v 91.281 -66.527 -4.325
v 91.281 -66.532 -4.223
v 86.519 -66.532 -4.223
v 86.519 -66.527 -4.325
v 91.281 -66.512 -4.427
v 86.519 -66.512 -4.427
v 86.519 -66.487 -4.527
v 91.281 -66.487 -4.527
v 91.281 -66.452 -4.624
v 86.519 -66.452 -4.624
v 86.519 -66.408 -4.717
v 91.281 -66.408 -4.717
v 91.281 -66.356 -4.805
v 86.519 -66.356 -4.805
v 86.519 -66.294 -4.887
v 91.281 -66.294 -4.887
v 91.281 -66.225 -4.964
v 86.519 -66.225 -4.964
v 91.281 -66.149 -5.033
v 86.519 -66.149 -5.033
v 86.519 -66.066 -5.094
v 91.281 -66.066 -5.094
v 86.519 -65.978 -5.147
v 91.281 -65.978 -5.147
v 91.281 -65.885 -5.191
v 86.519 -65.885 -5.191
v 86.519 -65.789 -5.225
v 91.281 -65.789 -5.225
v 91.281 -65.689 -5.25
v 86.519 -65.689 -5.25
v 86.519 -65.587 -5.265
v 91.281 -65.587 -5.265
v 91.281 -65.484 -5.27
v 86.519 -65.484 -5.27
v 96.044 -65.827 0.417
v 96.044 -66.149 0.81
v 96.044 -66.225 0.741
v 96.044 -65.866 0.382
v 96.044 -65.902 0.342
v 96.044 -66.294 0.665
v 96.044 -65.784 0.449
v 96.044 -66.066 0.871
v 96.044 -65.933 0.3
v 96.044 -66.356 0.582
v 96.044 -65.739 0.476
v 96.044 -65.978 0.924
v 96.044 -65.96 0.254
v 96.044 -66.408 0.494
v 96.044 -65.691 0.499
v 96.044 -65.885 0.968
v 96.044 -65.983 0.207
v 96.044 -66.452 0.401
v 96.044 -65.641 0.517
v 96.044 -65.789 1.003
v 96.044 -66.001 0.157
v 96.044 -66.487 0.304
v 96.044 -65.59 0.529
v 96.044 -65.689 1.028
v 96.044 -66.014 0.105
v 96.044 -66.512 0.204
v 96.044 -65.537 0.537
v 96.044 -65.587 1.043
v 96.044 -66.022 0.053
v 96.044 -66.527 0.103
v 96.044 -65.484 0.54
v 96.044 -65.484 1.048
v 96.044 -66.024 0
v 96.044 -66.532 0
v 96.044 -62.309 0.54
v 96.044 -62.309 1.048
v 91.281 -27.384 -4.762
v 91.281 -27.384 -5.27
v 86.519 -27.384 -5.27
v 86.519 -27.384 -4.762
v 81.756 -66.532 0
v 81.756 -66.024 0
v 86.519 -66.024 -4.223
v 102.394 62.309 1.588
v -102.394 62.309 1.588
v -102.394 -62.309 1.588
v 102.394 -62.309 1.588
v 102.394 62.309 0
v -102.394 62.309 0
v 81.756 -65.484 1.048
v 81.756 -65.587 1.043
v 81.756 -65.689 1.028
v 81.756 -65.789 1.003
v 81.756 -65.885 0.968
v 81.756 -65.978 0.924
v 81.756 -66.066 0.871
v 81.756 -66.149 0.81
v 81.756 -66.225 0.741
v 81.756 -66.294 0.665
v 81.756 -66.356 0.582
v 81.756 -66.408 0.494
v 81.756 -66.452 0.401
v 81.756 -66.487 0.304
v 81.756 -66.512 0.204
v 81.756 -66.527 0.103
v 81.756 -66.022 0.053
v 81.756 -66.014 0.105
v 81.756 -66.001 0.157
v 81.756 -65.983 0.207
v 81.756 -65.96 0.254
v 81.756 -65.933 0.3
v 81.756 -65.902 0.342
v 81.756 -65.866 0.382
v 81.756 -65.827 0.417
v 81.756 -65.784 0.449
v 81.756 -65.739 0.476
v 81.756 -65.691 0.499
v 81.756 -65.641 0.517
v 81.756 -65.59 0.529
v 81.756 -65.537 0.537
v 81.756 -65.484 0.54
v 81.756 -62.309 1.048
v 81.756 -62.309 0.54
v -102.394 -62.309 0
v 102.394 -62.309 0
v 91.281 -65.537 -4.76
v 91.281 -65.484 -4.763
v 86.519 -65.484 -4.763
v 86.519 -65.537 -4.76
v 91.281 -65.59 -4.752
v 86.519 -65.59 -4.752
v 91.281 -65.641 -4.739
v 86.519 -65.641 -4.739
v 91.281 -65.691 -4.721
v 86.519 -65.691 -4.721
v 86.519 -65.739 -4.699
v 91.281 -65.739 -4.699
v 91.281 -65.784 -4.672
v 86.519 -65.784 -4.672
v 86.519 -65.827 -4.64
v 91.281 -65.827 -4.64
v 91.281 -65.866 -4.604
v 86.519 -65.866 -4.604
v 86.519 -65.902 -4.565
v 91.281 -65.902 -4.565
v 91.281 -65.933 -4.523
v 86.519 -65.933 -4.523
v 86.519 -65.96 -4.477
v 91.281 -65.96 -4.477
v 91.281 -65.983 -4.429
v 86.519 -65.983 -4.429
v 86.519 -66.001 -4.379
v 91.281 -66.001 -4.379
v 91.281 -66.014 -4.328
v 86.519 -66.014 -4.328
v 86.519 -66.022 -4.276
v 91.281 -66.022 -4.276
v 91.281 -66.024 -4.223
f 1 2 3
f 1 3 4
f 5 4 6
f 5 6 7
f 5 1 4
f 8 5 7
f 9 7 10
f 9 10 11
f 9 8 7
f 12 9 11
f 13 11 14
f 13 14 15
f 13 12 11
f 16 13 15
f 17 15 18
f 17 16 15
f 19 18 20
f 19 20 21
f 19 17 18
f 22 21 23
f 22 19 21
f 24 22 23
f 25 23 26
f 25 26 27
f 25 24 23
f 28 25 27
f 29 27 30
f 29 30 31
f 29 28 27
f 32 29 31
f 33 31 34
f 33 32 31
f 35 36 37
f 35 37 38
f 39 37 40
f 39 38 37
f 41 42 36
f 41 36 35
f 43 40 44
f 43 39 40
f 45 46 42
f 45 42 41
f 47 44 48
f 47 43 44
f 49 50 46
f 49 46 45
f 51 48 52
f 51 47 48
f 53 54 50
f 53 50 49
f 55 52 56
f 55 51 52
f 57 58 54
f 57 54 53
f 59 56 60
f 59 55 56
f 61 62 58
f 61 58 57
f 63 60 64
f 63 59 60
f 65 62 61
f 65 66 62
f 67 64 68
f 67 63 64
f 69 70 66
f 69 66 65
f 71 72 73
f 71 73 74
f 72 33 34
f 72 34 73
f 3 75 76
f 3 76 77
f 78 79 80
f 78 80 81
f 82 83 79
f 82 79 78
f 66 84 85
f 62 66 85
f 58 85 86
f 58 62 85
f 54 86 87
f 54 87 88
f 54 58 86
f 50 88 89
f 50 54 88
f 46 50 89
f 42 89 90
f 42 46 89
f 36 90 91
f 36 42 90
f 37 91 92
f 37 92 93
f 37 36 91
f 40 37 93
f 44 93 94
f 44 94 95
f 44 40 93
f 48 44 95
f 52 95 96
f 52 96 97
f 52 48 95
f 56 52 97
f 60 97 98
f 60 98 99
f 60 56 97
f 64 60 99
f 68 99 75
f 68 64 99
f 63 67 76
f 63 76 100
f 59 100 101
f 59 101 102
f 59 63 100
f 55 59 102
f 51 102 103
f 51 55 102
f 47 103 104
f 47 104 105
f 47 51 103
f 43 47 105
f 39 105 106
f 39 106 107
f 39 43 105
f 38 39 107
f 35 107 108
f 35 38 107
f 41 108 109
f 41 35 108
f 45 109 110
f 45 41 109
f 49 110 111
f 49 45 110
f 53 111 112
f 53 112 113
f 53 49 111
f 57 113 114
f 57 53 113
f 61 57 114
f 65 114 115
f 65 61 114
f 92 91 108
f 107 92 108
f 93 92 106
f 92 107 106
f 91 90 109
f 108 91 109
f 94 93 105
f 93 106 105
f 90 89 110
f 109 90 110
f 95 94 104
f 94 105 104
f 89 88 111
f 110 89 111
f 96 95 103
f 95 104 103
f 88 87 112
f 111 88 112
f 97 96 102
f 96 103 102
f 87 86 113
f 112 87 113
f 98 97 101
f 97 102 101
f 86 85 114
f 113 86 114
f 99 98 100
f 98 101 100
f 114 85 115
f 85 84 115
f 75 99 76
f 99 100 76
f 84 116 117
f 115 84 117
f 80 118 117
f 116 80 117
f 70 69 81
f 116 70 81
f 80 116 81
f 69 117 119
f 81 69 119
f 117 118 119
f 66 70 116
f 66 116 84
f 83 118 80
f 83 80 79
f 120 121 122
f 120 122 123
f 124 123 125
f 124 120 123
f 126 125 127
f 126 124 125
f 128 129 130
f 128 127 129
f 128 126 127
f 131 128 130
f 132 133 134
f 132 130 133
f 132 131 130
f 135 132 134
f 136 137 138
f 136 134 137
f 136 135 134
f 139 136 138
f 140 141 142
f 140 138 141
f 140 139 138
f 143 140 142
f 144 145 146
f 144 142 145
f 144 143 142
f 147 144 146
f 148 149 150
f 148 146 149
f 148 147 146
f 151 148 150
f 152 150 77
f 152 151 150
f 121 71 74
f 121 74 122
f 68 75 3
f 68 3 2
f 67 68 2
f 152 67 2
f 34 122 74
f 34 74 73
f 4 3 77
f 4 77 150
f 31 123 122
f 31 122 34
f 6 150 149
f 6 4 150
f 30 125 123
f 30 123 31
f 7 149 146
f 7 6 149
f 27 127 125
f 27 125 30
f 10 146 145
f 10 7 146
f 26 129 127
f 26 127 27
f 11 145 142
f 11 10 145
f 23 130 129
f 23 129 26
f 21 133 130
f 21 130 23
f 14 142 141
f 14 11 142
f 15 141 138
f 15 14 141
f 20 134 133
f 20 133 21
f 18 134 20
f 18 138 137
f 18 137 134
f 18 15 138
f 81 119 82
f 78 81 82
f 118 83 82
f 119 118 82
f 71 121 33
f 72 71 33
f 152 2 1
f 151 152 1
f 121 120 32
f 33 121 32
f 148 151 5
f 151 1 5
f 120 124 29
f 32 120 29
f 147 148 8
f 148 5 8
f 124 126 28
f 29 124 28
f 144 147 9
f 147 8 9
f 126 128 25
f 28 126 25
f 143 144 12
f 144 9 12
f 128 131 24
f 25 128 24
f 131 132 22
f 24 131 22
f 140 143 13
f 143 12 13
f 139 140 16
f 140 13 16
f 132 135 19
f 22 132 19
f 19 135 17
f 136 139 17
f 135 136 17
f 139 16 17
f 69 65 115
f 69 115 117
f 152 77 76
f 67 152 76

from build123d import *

# Parameters (mm, degrees)
SKETCH1_W           = 204.7875
SKETCH1_H           = 124.61875
BOSS_EXTRUDE1_DEPTH = 1.5875
EXTRUDE_THIN1_DEPTH = 14.2875
CUT_EXTRUDE1_DEPTH  = 165.658404983


with BuildPart() as part:
    # Sketch1 → Boss-Extrude1 (new body)
    with BuildSketch(Plane.XY):
        Rectangle(SKETCH1_W, SKETCH1_H)
    extrude(amount=BOSS_EXTRUDE1_DEPTH)

    # Sketch2 → Extrude-Thin1 (add)
    with BuildSketch(Plane(origin=(96.04375, 0, 0), x_dir=(0, 0, -1), z_dir=(1, 0, 0))):
        with BuildLine():
            Line((-1.04775, -62.309375), (-1.04775, -65.484375))
            ThreePointArc((-1.04775, -65.484375), (-0.74087113, -66.22524613), (0, -66.532125))
            Line((0, -66.532125), (4.22275, -66.532125))
            ThreePointArc((4.22275, -66.532125), (4.96362113, -66.22524613), (5.2705, -65.484375))
            Line((5.2705, -65.484375), (5.2705, -27.384375))
            Line((5.2705, -27.384375), (4.7625, -27.384375))
            Line((4.7625, -27.384375), (4.7625, -65.484375))
            ThreePointArc((4.7625, -65.484375), (4.604410885, -65.866035885), (4.22275, -66.024125))
            Line((4.22275, -66.024125), (0, -66.024125))
            ThreePointArc((0, -66.024125), (-0.381660885, -65.866035885), (-0.53975, -65.484375))
            Line((-0.53975, -65.484375), (-0.53975, -62.309375))
            Line((-0.53975, -62.309375), (-1.04775, -62.309375))
        make_face()
    extrude(amount=-EXTRUDE_THIN1_DEPTH)

    # Sketch3 → Cut-Extrude1 (cut, through all)
    with BuildSketch(Plane.XZ.offset(66.532125)):
        Polygon((81.75625, 0), (86.51875, -4.22275), (86.51875, -5.2705), (81.75625, -5.2705), align=None)
        Polygon((91.28125, -4.22275), (91.28125, -5.2705), (96.04375, -5.2705), (96.04375, 0), align=None)
    extrude(amount=-CUT_EXTRUDE1_DEPTH, mode=Mode.SUBTRACT)


solid = part.part
